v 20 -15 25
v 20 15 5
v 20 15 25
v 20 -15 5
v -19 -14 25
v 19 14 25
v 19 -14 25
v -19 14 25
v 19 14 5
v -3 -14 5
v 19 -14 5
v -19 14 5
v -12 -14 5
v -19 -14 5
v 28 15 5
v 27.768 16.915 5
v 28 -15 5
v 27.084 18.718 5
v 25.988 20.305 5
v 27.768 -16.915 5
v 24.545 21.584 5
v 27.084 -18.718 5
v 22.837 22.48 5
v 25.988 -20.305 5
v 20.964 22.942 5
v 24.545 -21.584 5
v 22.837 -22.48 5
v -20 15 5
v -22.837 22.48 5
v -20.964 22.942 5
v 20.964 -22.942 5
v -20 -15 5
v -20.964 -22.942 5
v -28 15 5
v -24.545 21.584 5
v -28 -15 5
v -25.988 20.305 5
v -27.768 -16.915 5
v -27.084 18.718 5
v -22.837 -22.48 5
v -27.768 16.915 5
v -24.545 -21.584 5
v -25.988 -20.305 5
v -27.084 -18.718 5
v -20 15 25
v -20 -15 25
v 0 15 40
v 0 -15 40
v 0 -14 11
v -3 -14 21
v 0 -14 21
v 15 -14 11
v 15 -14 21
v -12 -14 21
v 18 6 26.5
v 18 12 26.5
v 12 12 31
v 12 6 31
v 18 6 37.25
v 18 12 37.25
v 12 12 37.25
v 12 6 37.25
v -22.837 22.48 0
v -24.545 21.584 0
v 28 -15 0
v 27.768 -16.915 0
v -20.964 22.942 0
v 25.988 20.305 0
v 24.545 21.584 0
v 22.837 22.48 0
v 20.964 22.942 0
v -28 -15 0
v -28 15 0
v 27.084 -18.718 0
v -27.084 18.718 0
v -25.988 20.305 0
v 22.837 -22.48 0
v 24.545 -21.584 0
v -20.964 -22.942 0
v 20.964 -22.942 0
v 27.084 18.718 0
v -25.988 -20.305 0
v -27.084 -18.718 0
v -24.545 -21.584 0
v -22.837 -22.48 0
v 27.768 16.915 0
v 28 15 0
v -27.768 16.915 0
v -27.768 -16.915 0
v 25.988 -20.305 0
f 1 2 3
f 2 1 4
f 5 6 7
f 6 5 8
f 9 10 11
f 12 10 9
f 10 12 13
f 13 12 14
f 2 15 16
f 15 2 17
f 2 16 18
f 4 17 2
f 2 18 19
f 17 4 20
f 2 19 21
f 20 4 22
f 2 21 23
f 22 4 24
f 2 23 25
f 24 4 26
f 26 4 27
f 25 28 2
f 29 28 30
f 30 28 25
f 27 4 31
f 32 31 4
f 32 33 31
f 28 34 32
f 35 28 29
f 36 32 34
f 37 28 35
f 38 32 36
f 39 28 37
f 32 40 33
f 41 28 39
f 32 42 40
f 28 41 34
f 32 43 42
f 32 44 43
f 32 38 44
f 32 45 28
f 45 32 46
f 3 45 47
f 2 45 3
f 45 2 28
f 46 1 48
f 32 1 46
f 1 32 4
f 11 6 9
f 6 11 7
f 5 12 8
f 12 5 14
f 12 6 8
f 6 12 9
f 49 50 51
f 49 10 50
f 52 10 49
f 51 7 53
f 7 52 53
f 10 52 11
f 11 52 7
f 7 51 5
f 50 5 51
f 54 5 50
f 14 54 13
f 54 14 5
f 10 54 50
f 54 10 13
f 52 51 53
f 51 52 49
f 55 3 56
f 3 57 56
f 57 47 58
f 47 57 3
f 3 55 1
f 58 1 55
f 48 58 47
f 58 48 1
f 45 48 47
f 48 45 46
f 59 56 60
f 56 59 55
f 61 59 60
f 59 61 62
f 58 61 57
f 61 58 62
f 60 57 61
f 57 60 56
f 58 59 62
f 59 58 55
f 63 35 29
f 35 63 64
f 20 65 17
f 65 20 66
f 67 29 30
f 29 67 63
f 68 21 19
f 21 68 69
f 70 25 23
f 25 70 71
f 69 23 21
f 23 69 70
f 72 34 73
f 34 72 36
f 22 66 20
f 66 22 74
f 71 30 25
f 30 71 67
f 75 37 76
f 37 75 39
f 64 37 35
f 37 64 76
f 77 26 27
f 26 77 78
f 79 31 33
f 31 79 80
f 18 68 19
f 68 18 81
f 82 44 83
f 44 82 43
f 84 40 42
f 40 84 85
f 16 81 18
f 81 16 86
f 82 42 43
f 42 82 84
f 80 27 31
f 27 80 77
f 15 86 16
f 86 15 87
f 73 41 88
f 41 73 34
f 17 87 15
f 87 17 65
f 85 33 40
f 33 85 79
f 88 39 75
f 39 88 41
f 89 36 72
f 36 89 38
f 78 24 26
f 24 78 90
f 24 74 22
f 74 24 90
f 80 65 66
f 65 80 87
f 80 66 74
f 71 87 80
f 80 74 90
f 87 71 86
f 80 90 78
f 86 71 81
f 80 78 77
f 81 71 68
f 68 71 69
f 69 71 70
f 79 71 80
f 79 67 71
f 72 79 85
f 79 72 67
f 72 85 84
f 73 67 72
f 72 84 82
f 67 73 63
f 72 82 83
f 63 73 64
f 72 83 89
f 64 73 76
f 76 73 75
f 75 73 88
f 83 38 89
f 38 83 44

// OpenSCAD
/*****************************************************************************
** OpenSCAD Example Code by Michal Altair Valasek - https://www.rider.cz    **
** Licensed under terms of Creative Commons Attribution License (cc-by)     **
** https://creativecommons.org/licenses/by/4.0/                             **
*****************************************************************************/

base_width = 40;    // X
base_depth = 30;    // Y
base_height = 20;   // Z
wall = 1;
roof_height = 15;   // Z
door_width = 9;     // X
door_height = 16;   // Z
window_width = 15;  // X
window_height = 10; // Z
window_bottom = 6;  // Z offset
chimney_size = 6;   // X, Y
grass_offset = 8;   // X, Y offset
grass_height = 5;   // Z

$vpt = [4, 2, 12];
$vpr = [60, 0, 360 * $t];
$vpd = 180;

offset = [-base_width / 2 - grass_offset, -base_depth / 2 - grass_offset];
translate(offset) house();

module house() {
    grass();
    translate([grass_offset, grass_offset, grass_height]) {
        base();
        translate([0, 0, base_height]) roof();
        translate([base_width * .8, base_depth * .7, base_height + 1]) chimney();
    }
}

module base() {
    difference() {
        // Home shell
        color("yellow") cube([base_width, base_depth, base_height]);
        translate([wall, wall, -1]) cube([base_width - 2 * wall, base_depth - 2 * wall, base_height + 2]);

        // Door hole
        translate([base_width / 5, -1, -1]) cube([door_width, wall + 2, door_height + 1]);

        // Window hole
        translate([base_width / 2, -1, window_bottom]) cube([window_width, wall + 2, window_height]);
    }

    // Door
    color("brown") translate([base_width / 5, 0, 0]) cube([door_width, wall, door_height]);

    // Window
    color("blue", .25) translate([base_width / 2, 0, window_bottom]) cube([window_width, wall, window_height]);
}

module roof() {
    points = [ 
        [0, 0, 0], [base_width, 0, 0], [base_width, base_depth, 0], [0, base_depth, 0], // base corners
        [base_width / 2, 0, roof_height], [base_width / 2, base_depth, roof_height]      // roof corners
    ];
    faces = [ 
        [0, 1, 2, 3],   // base
        [3, 4, 0],      // left triangle
        [1, 5, 2],      // right triangle
        [4, 5, 1, 0],   // front side,
        [5, 4, 3, 2]    // back side
    ];
    color("red") polyhedron(points, faces, convexity = 10);
}

module chimney() {
    color("black") cube([chimney_size, chimney_size, roof_height * .75]);
}

module grass(){
    color("green") rcube([base_width + 2 * grass_offset, base_depth + 2 * grass_offset, grass_height], grass_offset);
}

module rcube(size, radius) {
    if(radius < 1){
        cube(size);
    } else {
        hull() {
            translate([radius, radius]) cylinder(r = radius, h = size[2]);
            translate([size[0] - radius, radius]) cylinder(r = radius, h = size[2]);
            translate([size[0] - radius, size[1] - radius]) cylinder(r = radius, h = size[2]);
            translate([radius, size[1] - radius]) cylinder(r = radius, h = size[2]);
        }
    }
}
